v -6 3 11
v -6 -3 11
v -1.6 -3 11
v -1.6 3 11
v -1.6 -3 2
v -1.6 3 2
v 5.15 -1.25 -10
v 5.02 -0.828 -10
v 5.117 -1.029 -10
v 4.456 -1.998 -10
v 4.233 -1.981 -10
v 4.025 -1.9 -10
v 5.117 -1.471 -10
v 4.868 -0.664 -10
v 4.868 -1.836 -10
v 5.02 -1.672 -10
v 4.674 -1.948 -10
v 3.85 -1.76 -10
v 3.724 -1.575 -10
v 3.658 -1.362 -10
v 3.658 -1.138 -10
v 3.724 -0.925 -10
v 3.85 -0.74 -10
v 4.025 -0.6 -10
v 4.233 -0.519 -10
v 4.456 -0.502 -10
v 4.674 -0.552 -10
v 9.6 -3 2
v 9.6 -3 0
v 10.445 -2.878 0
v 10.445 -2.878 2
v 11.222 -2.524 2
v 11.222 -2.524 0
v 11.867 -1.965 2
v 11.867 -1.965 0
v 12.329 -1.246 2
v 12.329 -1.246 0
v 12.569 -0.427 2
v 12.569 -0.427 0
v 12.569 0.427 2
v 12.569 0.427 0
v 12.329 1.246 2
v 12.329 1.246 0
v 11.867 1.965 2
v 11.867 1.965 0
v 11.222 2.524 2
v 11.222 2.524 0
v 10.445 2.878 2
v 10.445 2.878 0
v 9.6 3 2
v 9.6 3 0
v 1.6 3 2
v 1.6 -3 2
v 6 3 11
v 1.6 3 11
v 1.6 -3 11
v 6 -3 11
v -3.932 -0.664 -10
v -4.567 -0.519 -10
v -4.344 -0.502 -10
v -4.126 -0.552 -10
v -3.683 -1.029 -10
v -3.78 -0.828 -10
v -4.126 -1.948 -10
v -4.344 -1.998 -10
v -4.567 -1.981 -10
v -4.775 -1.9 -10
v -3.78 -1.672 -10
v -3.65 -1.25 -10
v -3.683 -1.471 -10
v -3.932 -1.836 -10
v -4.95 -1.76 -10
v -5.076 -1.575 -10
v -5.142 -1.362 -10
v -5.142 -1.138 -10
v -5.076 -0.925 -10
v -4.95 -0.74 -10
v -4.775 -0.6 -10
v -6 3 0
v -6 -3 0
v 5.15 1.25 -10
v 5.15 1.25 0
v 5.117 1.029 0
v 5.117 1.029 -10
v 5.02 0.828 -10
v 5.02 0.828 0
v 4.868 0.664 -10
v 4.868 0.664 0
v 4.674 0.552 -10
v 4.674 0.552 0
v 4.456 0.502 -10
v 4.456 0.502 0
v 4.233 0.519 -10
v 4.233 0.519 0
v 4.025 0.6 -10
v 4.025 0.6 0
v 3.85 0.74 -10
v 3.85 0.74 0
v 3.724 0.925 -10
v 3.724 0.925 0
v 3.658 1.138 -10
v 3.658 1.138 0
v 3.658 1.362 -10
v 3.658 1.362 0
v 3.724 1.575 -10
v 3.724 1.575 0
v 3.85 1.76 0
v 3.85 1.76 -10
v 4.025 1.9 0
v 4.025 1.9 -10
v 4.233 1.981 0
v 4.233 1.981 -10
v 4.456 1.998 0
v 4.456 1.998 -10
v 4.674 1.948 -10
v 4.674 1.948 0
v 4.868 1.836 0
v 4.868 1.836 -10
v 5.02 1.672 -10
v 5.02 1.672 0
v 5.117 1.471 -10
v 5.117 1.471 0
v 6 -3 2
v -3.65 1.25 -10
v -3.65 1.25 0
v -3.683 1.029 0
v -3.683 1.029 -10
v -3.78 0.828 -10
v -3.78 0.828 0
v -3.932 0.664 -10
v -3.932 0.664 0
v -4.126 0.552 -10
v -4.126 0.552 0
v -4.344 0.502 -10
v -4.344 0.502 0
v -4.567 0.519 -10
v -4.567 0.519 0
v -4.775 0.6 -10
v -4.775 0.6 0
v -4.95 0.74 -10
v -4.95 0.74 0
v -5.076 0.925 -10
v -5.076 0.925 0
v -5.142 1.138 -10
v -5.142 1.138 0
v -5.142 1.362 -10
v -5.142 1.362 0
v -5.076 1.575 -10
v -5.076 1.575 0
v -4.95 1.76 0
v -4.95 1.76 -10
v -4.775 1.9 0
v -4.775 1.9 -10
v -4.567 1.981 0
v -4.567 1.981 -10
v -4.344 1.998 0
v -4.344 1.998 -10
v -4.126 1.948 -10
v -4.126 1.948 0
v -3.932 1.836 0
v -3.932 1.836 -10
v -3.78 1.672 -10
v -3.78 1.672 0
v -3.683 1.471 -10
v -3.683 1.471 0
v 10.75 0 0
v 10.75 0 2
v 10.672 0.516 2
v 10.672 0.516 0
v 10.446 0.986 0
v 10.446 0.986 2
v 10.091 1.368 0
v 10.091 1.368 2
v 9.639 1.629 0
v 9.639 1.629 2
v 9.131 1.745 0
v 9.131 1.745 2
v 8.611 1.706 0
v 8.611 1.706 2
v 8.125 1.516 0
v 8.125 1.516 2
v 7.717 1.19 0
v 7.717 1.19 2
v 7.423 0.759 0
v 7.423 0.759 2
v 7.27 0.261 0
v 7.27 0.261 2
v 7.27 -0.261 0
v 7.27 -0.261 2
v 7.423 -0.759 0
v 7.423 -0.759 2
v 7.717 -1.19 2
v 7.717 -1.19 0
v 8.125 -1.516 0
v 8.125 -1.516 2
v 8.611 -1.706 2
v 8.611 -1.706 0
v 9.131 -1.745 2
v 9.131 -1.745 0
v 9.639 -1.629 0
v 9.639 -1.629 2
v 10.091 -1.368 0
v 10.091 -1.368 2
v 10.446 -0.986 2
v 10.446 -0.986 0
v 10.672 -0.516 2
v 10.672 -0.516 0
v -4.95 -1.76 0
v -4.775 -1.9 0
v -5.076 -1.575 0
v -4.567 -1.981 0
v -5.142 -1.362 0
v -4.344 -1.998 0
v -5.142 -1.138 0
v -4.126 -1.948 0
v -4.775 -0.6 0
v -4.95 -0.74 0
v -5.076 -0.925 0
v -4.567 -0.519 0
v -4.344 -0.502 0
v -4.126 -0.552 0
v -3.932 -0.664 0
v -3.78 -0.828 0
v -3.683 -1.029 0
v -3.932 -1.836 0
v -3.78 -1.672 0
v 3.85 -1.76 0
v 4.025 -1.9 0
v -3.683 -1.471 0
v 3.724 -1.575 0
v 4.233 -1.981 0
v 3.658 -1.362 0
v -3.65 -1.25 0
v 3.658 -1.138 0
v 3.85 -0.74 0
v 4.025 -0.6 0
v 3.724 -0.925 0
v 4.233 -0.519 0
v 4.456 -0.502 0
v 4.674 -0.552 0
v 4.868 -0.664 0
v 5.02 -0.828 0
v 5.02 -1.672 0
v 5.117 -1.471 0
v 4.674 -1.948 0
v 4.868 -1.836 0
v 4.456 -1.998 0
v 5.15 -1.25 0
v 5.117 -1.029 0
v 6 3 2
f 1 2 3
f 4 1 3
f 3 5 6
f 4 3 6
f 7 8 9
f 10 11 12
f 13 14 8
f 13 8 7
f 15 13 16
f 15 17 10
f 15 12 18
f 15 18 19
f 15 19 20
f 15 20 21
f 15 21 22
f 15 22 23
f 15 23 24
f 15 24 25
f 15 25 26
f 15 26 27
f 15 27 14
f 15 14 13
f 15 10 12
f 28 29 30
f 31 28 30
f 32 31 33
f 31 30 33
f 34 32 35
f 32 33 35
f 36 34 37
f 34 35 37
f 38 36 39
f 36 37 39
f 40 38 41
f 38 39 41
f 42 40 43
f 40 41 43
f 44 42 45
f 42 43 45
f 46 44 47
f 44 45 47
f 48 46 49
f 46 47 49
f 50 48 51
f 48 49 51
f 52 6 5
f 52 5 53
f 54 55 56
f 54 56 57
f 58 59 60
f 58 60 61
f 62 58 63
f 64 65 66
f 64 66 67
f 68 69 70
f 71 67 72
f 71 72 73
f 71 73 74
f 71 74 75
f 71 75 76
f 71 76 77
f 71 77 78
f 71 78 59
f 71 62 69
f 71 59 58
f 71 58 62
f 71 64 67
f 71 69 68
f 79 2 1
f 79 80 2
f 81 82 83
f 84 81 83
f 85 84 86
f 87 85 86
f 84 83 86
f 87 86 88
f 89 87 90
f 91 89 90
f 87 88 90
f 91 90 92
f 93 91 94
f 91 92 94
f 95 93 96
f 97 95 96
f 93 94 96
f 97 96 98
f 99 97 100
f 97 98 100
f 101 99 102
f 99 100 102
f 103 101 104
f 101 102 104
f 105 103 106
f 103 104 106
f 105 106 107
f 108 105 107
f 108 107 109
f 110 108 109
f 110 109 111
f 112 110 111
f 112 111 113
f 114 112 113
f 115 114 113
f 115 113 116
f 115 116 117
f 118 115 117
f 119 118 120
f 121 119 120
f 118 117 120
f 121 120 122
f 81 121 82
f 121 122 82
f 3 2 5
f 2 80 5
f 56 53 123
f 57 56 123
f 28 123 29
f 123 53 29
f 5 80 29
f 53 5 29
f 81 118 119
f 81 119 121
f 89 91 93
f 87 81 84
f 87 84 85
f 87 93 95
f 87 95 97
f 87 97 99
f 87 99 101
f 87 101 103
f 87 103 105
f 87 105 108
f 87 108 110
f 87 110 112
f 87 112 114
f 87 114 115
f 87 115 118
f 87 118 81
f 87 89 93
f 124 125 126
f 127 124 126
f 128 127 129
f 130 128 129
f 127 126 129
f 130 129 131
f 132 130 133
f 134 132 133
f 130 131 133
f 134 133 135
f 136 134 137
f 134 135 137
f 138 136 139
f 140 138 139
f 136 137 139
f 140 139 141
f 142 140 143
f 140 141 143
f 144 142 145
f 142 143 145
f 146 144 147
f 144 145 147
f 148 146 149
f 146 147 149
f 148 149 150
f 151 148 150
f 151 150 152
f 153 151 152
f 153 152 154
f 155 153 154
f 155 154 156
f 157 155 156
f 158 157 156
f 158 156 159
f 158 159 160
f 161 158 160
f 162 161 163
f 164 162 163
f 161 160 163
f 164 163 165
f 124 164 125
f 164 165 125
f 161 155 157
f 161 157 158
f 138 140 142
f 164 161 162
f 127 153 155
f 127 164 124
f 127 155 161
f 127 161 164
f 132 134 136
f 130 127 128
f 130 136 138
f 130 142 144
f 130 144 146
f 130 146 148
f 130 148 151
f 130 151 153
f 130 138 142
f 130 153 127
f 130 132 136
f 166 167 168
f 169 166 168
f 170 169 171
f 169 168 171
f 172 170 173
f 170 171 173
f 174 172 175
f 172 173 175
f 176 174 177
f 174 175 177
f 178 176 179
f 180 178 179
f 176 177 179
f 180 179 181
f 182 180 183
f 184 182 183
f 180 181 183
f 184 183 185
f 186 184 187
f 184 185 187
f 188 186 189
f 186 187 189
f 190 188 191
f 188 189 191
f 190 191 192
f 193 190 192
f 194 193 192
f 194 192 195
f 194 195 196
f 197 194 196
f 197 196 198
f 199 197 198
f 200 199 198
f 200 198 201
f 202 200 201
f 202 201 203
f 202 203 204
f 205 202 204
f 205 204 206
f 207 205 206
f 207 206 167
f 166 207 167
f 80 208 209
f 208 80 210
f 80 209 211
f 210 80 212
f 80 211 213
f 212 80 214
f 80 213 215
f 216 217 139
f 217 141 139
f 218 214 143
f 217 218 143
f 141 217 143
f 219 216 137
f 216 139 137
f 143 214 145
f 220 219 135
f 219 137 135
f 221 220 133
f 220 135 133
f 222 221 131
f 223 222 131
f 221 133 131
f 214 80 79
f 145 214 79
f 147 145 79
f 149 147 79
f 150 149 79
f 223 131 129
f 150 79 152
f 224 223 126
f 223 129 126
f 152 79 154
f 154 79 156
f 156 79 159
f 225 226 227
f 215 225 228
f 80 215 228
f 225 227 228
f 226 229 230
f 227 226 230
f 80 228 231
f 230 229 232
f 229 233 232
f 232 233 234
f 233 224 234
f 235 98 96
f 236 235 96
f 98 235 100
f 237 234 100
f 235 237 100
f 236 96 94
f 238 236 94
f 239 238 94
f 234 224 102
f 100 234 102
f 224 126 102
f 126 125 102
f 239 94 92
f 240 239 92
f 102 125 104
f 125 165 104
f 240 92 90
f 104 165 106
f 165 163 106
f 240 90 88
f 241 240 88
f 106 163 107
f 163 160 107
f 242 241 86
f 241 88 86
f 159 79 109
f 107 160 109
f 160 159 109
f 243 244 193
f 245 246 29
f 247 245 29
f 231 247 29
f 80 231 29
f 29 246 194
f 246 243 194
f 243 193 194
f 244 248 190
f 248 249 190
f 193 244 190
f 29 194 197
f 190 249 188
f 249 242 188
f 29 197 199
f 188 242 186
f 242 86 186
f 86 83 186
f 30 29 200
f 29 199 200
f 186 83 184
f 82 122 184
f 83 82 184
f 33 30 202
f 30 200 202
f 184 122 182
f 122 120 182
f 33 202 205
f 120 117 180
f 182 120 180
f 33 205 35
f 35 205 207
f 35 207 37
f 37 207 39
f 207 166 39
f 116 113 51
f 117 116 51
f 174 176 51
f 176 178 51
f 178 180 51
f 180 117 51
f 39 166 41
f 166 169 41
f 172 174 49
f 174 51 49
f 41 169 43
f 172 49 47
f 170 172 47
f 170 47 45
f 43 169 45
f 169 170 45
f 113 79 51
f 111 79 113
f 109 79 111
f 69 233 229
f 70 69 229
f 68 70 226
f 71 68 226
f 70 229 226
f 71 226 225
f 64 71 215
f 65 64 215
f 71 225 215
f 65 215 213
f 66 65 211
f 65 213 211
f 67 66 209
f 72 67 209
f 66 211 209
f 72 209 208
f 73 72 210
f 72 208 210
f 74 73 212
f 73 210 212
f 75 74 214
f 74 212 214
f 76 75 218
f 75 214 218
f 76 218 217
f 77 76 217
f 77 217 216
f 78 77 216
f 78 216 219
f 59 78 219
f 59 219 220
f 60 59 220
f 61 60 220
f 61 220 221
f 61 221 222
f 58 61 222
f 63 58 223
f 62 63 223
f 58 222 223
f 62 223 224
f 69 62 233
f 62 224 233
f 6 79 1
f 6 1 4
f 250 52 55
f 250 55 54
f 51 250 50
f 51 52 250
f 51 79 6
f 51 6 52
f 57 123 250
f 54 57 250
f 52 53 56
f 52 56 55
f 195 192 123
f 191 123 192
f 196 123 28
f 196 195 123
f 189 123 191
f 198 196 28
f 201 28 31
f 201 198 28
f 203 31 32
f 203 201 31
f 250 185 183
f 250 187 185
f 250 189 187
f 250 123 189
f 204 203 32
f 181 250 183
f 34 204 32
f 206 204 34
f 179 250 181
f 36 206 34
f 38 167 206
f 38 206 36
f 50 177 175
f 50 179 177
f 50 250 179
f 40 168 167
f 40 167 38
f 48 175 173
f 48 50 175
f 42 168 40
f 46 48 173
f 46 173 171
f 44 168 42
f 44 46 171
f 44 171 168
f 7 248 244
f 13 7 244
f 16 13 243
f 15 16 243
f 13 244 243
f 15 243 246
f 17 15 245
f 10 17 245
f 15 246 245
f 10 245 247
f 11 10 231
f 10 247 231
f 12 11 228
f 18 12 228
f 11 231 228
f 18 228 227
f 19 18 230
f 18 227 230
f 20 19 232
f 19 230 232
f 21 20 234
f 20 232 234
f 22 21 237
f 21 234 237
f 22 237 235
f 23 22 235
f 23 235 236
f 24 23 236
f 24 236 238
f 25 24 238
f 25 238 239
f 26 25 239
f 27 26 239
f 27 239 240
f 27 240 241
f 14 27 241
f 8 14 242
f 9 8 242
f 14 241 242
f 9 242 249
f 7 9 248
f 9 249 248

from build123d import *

# Parameters (mm, degrees)
F1_DEPTH = 2
F2_W     = 4.4
F2_H     = 6
F3_DEPTH = 9
F4_R     = 0.75
F5_DEPTH = 10
F6_R     = 1.75
F7_DEPTH = 12.001


with BuildPart() as f1:
    # F0 (on Top) → F1 (new body)
    with BuildSketch(Plane.XY):
        with BuildLine():
            Line((6, 3), (-6, 3))
            Line((-6, 3), (-6, -3))
            Line((-6, -3), (6, -3))
            Line((6, -3), (9.6, -3))
            ThreePointArc((9.6, -3), (12.6, 0), (9.6, 3))
            Line((9.6, 3), (6, 3))
        make_face()
    extrude(amount=F1_DEPTH)

    # F2 (on face) → F3 (join)
    with BuildSketch(Plane.XY.offset(2)):
        with Locations((-3.8, 0)):
            Rectangle(F2_W, F2_H)
        with Locations((3.8, 0)):
            Rectangle(F2_W, F2_H)
    extrude(amount=F3_DEPTH)

    # F4 (on face) → F5 (join)
    with BuildSketch(Plane(origin=(0, 0, 0), x_dir=(1, 0, 0), z_dir=(0, 0, -1))):
        with Locations((-4.4, 1.25)):
            Circle(F4_R)
        with Locations((4.4, 1.25)):
            Circle(F4_R)
        with Locations((4.4, -1.25)):
            Circle(F4_R)
        with Locations((-4.4, -1.25)):
            Circle(F4_R)
    extrude(amount=F5_DEPTH)

    # F6 (on face) → F7 (cut, through all)
    with BuildSketch(Plane.XY.offset(2)):
        with Locations((9, 0)):
            Circle(F6_R)
    extrude(amount=-F7_DEPTH, mode=Mode.SUBTRACT)


solid = f1.part
